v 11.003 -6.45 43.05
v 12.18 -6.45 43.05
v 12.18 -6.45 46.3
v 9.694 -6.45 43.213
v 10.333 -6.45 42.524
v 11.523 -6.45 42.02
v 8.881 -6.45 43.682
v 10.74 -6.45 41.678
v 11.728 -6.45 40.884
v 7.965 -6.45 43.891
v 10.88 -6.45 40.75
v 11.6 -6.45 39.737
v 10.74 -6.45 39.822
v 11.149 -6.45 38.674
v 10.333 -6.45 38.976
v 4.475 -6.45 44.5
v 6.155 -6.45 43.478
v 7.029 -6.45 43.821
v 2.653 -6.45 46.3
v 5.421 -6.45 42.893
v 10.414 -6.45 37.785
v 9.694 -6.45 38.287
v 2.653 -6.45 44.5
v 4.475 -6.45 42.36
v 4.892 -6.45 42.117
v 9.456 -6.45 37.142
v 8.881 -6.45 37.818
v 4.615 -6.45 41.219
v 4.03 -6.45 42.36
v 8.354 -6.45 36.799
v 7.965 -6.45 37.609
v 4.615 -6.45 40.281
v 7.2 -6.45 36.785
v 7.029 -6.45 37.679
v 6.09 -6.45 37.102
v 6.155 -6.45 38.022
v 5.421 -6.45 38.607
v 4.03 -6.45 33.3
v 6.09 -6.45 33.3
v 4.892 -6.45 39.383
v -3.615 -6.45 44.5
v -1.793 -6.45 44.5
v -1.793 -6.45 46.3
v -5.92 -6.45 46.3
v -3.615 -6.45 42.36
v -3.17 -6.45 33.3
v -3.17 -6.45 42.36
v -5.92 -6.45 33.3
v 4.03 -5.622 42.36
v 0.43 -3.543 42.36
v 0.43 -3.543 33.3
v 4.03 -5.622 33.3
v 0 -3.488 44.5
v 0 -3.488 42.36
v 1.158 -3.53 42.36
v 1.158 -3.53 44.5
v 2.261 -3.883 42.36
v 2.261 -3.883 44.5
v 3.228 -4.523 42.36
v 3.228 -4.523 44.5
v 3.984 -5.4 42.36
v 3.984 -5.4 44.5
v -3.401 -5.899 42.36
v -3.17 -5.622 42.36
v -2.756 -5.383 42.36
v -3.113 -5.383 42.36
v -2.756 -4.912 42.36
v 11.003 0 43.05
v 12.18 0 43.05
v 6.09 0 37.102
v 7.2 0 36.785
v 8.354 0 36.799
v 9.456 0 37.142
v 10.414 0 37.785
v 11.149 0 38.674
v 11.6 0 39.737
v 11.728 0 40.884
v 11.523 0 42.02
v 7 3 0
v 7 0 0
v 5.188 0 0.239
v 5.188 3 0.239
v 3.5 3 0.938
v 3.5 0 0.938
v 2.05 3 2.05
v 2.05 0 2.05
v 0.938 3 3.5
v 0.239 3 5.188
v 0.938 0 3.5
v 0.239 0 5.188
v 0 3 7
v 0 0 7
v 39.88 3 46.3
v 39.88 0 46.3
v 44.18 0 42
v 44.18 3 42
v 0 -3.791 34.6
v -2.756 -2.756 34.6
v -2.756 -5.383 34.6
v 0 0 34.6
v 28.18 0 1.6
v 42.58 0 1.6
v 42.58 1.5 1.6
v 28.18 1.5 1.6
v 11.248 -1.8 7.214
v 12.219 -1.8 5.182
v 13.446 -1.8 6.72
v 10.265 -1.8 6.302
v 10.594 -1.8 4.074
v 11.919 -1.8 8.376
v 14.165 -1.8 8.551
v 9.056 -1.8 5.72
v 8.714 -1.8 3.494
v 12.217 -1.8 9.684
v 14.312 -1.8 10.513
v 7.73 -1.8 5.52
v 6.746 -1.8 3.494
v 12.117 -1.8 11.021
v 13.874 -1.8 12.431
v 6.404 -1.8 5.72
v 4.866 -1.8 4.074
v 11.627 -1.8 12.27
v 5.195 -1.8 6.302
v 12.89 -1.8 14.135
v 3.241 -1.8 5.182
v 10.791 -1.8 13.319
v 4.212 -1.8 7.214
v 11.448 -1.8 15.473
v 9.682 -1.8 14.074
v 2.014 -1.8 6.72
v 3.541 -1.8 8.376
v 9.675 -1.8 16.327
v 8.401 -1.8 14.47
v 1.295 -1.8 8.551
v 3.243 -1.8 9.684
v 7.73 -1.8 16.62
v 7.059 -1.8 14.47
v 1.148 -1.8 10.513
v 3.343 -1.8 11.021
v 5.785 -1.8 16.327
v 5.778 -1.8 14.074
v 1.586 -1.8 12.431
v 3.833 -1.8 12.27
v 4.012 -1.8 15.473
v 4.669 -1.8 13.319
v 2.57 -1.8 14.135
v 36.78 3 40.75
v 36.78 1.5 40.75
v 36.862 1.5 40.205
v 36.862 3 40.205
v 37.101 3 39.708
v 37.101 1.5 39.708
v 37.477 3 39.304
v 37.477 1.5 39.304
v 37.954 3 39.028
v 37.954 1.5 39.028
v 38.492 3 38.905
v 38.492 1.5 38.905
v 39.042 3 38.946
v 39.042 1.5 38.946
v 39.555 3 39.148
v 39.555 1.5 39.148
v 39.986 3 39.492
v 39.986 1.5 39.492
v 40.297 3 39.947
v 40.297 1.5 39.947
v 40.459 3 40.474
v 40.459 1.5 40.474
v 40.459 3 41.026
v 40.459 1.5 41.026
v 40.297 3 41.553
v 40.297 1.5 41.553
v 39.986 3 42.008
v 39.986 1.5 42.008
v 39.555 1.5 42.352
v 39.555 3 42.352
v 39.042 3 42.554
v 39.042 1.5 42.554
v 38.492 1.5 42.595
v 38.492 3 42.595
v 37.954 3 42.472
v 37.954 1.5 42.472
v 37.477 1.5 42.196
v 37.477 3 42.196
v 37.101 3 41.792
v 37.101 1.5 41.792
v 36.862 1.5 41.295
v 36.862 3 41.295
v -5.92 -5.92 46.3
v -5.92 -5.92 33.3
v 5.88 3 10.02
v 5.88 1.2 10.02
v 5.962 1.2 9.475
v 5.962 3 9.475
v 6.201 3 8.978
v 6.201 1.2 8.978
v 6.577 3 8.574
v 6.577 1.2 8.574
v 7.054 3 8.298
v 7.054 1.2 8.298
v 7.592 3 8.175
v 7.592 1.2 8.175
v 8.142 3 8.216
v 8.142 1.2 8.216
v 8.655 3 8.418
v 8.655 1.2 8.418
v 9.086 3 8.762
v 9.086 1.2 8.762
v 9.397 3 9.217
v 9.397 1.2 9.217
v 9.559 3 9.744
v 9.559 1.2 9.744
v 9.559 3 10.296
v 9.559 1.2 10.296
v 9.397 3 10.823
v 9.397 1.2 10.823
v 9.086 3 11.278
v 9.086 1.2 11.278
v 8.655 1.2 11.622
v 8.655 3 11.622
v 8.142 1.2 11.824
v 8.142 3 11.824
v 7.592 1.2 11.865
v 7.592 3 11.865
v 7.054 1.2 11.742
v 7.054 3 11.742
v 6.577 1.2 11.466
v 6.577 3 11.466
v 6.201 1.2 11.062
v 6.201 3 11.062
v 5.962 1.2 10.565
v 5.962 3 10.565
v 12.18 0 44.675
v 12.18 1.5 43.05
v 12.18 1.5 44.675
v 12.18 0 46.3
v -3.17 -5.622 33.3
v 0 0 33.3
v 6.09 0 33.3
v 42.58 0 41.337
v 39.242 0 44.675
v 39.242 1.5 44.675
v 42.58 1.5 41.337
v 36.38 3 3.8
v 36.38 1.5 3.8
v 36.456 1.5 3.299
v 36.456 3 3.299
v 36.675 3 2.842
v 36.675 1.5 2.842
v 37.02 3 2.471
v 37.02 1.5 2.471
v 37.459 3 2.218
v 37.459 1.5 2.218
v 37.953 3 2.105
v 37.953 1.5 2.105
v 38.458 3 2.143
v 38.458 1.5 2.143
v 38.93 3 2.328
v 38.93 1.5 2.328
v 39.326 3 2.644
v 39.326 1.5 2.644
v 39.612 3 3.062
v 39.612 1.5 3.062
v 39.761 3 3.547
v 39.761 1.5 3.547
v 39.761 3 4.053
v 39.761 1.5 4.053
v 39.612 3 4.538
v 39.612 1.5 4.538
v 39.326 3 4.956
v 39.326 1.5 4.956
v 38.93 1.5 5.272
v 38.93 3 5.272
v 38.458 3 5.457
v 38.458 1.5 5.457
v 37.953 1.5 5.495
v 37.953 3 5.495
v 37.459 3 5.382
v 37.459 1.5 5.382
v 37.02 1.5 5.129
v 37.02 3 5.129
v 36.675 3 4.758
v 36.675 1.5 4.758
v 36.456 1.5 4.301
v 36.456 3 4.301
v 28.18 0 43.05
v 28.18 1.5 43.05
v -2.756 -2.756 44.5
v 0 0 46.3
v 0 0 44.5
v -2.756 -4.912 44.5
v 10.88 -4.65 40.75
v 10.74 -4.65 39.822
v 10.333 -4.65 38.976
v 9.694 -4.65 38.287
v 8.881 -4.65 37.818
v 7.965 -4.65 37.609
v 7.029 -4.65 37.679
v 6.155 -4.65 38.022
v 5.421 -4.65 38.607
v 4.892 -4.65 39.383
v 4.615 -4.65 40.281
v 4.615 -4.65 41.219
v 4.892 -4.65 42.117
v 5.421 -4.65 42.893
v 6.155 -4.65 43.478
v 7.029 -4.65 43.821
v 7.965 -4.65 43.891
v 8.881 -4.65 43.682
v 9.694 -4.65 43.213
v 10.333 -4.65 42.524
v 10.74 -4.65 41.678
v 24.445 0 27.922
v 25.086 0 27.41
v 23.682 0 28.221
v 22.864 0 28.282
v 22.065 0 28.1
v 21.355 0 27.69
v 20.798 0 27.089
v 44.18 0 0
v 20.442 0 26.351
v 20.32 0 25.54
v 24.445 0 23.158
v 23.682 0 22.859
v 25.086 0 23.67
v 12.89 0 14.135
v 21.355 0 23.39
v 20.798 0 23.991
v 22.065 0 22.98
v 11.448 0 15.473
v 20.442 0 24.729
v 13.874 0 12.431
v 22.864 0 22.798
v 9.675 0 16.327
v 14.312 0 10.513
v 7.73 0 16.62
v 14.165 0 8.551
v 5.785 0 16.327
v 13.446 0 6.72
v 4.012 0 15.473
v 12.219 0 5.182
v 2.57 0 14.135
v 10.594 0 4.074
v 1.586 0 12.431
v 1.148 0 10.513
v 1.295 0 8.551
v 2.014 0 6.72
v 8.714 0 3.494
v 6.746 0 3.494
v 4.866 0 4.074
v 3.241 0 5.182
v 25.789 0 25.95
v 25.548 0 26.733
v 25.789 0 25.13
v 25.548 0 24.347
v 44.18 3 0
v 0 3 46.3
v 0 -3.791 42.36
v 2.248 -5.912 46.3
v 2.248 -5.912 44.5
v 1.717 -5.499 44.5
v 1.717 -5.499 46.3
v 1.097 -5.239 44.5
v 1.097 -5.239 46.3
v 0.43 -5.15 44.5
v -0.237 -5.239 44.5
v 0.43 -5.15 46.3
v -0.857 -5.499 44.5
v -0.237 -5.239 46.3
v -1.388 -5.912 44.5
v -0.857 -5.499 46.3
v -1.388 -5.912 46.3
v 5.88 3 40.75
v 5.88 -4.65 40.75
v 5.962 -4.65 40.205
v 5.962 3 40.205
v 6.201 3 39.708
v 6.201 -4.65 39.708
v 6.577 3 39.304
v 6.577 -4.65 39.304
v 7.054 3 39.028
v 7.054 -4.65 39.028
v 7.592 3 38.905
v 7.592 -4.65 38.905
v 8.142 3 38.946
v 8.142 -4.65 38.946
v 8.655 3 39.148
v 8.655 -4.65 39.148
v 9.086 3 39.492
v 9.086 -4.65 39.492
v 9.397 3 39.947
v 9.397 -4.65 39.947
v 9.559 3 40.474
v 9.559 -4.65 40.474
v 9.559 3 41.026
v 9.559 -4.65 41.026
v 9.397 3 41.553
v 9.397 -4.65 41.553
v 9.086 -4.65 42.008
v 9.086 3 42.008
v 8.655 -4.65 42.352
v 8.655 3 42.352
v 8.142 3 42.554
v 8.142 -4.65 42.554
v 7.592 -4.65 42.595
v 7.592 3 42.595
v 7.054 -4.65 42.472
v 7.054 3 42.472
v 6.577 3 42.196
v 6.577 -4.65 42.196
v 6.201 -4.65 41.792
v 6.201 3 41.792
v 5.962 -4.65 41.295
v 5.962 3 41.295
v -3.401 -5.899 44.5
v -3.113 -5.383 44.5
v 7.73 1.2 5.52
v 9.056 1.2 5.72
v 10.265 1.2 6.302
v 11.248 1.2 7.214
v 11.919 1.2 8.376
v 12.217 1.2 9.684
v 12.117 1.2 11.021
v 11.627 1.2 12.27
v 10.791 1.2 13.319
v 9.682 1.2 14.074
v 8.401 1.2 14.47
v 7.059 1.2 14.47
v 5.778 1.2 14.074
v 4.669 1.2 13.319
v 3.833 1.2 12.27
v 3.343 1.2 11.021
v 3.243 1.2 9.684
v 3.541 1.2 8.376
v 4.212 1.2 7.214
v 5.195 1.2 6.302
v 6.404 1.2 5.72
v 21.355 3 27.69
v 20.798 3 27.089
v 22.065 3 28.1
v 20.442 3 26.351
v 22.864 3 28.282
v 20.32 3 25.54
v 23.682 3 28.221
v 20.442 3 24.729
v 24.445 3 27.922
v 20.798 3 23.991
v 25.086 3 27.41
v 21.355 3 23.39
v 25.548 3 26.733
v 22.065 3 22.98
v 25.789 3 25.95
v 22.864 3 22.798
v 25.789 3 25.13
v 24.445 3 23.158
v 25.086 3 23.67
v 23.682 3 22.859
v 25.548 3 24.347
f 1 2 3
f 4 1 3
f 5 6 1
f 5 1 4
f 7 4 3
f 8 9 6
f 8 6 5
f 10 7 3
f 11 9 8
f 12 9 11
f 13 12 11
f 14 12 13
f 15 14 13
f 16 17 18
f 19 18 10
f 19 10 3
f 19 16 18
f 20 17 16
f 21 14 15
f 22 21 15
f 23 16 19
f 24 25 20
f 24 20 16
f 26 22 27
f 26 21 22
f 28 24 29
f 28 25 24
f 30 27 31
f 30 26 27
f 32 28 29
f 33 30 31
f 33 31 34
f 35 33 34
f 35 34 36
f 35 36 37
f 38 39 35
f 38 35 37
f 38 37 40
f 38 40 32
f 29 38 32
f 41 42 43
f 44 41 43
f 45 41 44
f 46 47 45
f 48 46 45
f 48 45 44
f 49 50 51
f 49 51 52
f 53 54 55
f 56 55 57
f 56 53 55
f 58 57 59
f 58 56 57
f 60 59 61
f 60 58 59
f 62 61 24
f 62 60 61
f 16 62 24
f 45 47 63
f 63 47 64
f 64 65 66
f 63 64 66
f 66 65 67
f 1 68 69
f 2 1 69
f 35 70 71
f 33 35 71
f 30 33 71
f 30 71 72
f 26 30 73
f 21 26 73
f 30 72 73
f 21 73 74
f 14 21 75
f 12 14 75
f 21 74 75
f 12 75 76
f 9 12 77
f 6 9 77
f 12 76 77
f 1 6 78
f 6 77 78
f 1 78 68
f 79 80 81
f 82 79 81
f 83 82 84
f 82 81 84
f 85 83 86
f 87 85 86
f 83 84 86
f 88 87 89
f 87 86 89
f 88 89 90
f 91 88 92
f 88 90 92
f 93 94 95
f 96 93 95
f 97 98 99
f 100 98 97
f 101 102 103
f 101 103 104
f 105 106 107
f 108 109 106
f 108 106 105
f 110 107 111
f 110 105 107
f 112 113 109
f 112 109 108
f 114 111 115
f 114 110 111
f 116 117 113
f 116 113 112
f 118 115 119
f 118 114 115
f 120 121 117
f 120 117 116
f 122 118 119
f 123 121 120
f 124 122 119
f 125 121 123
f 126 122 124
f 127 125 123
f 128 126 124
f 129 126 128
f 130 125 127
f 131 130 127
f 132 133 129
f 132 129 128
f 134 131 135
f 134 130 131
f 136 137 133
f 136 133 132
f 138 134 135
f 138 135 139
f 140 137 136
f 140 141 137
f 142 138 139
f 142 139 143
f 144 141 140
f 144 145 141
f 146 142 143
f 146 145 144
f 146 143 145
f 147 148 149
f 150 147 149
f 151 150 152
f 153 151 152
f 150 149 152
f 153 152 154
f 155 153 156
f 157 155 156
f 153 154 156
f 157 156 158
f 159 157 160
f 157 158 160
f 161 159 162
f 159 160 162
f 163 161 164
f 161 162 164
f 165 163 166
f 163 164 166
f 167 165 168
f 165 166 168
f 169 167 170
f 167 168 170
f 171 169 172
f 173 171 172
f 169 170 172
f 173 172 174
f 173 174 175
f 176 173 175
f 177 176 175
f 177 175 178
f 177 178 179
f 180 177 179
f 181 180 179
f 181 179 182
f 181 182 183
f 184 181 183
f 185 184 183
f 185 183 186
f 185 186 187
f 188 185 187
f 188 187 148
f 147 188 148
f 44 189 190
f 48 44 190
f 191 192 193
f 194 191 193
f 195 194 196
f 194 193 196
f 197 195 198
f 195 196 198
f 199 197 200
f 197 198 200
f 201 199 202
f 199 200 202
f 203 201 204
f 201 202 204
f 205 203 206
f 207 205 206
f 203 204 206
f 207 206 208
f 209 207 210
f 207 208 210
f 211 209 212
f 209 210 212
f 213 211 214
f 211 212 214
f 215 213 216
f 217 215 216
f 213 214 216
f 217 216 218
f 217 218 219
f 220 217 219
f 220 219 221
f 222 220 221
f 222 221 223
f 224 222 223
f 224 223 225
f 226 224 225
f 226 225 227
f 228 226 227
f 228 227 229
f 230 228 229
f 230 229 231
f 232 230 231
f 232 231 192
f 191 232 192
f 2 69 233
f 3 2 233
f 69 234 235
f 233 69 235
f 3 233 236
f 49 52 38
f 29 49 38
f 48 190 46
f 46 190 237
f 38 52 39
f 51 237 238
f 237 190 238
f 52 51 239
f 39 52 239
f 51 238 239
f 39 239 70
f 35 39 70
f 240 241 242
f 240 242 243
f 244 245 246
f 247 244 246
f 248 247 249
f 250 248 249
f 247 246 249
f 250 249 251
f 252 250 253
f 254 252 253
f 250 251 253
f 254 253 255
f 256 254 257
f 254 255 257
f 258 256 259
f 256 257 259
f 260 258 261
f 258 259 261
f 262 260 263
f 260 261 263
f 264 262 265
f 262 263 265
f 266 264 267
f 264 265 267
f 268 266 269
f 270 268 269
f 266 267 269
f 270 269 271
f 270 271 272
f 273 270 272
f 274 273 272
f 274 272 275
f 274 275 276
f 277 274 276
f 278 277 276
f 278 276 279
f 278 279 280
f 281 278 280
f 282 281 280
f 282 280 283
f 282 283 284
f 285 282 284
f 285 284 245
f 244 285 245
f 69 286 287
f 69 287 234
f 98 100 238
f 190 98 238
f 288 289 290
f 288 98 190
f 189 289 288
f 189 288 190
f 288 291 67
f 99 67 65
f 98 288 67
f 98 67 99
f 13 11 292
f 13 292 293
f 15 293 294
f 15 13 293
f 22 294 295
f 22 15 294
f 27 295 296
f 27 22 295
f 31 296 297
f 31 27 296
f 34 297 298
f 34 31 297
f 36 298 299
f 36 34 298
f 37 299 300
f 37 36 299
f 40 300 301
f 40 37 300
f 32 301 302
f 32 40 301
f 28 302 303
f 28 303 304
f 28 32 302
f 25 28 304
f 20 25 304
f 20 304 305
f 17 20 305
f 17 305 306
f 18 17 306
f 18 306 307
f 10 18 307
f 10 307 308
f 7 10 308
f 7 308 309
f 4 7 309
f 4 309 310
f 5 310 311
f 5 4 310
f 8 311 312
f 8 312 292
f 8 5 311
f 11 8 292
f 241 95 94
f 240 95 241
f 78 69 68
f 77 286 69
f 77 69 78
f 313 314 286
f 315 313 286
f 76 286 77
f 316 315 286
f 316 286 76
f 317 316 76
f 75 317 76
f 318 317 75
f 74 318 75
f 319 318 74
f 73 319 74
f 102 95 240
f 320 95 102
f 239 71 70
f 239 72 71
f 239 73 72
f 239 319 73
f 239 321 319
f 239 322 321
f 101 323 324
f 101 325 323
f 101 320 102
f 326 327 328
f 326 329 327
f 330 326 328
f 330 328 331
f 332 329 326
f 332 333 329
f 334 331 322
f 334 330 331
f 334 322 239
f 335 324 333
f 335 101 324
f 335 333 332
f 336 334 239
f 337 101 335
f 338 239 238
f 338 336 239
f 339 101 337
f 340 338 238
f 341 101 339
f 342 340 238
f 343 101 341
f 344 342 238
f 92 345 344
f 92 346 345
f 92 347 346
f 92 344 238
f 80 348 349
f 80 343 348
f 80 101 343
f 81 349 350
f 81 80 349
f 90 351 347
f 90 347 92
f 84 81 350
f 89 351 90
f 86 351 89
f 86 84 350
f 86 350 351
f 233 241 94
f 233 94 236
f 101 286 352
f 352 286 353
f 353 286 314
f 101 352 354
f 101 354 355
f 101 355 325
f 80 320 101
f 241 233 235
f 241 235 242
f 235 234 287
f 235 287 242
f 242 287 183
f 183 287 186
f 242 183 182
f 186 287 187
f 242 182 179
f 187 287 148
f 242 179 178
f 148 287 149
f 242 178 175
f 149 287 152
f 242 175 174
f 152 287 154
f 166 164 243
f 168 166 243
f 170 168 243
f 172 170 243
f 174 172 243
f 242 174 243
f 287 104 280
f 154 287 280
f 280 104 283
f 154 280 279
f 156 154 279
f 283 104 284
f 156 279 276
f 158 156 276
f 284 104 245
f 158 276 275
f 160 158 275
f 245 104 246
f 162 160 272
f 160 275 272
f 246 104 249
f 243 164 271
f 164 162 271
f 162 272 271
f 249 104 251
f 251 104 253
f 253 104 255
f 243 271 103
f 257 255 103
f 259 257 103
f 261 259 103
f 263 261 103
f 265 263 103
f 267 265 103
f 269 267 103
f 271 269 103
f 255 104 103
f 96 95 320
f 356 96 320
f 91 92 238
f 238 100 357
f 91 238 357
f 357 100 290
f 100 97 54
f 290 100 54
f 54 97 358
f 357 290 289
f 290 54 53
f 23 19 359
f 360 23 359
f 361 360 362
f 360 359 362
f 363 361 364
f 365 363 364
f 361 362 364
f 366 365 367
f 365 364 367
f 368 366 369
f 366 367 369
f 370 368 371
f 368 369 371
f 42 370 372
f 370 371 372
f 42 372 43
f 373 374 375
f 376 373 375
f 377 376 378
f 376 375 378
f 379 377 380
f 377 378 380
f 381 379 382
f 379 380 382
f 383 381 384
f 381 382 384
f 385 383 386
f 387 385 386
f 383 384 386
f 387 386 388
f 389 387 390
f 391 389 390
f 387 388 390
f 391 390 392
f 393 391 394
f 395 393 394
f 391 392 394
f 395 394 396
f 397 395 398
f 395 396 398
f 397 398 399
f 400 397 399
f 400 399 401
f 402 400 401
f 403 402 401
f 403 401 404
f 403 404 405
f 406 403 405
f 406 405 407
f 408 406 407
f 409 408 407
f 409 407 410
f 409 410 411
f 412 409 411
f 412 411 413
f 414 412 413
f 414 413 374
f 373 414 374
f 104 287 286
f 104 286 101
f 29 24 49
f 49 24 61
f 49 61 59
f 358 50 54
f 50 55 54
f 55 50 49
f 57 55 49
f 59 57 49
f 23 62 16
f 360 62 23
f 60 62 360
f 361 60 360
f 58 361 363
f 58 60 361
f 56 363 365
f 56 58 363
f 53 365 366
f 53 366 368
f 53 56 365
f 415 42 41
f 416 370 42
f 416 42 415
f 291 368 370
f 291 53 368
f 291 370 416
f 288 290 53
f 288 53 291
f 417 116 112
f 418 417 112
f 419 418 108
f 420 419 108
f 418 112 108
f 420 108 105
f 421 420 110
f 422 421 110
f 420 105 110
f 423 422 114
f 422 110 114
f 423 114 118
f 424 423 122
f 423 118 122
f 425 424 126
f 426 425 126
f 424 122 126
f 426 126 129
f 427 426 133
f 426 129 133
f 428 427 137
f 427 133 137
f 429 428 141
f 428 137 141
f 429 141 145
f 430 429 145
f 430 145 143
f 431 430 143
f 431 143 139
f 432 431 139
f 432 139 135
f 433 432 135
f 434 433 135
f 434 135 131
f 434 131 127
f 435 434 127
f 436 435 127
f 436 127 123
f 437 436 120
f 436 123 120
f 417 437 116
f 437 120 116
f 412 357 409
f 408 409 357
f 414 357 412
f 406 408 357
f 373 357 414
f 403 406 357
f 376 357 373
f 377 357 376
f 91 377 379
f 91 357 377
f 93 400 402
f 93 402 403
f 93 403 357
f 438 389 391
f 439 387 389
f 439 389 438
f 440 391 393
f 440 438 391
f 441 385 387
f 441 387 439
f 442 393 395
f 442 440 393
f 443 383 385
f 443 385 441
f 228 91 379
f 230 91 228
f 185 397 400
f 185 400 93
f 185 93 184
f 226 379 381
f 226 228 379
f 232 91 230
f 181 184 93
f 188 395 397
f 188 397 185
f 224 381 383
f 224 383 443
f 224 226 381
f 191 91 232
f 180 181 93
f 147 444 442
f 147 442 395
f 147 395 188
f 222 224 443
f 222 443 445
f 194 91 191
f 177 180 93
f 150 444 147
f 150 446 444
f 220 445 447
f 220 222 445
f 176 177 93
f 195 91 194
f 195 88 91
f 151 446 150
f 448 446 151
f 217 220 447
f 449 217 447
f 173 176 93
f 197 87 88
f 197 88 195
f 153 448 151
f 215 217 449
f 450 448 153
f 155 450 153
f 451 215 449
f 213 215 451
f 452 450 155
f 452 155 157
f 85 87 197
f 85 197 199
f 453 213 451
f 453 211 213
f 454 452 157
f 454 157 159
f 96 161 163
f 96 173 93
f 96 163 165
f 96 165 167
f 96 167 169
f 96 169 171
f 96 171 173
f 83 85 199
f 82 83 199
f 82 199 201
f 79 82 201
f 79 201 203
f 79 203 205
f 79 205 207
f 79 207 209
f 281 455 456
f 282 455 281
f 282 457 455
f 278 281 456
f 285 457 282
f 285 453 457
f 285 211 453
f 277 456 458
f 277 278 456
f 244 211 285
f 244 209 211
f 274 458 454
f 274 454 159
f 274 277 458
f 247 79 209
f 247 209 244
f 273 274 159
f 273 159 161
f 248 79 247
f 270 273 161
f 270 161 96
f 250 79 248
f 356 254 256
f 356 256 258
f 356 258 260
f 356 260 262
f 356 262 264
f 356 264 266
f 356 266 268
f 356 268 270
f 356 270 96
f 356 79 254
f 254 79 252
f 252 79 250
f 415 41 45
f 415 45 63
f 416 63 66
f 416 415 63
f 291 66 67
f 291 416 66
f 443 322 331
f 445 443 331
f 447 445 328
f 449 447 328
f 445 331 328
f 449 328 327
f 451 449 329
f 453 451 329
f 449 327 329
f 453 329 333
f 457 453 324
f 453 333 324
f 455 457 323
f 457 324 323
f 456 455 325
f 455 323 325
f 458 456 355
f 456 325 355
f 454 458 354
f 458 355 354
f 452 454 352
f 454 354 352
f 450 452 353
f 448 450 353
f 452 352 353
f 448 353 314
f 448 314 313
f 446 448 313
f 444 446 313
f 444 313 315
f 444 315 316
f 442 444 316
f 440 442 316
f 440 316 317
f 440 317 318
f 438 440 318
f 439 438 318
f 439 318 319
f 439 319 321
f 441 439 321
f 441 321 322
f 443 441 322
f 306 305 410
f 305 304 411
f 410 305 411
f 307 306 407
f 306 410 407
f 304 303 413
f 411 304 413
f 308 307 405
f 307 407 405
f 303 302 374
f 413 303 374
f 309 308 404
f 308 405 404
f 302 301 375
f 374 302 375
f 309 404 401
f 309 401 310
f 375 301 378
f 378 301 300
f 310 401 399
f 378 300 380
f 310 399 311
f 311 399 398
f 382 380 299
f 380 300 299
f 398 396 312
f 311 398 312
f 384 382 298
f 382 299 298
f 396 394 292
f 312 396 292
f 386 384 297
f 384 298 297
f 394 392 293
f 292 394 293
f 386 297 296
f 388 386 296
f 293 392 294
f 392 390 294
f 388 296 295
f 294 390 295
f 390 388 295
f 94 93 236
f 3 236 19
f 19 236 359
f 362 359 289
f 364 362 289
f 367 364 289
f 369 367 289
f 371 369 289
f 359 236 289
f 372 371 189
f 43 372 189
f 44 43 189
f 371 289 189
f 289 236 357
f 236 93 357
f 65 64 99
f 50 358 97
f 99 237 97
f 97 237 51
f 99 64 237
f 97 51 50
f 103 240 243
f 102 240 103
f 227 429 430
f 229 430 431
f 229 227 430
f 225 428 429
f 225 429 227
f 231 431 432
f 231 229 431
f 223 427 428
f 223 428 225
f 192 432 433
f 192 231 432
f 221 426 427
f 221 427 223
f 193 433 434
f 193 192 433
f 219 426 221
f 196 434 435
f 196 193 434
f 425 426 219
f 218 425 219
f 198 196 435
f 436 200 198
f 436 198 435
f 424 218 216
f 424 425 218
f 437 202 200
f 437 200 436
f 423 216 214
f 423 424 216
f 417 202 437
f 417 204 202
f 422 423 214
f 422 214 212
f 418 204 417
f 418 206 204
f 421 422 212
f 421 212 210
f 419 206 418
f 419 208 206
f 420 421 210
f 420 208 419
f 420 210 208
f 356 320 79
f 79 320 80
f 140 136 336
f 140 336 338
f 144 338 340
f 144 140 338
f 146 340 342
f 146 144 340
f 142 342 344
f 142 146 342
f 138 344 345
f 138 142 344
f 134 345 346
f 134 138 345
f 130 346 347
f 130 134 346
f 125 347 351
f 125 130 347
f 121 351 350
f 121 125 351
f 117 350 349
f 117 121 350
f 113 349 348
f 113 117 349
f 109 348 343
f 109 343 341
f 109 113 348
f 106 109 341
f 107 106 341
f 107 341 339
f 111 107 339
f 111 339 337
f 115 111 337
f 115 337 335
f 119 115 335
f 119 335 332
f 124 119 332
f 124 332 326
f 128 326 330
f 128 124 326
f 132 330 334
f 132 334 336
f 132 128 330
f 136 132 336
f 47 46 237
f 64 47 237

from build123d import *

# Parameters (mm, degrees)
SKETCH1_R                  = 13.5
BOSS_EXTRUDE1_DEPTH        = 3
CAVITY26_OUTLINE_R         = 1.85
CAVITY26_OUTLINE_R_2       = 1.7
CAVITY26_DEPTH             = 1.5
F_24_0_24_DIAMETER_HOLE1_D = 3.7
BOSS_EXTRUDE2_START        = -3
SKETCH6_R                  = 13.5
BOSS_EXTRUDE2_DEPTH        = 3
F_24_0_24_DIAMETER_HOLE2_D = 5.5
SKETCH14_W                 = 5.92
SKETCH14_H                 = 13
BOSS_EXTRUDE6_DEPTH        = 9.45
SKETCH13_R                 = 4
BOSS_EXTRUDE7_DEPTH        = 6.45
BOSS_EXTRUDE8_DEPTH        = 6.45
F_24_0_24_DIAMETER_HOLE3_D = 3.7
CUT_EXTRUDE3_DEPTH         = 9.06
SKETCH19_R                 = 2.55
CUT_EXTRUDE4_DEPTH         = 1.8
CUT_EXTRUDE5_START         = -11.2
SKETCH23_R                 = 4.233528458
CUT_EXTRUDE5_DEPTH         = 2.14
SKETCH24_W                 = 2.756109072
SKETCH24_H                 = 9.9
CUT_EXTRUDE6_DEPTH         = 10
CAVITY27_DEPTH             = 1.5
CAVITY27_START             = -6.45
CAVITY27_2_OUTLINE_R       = 3.15
CAVITY27_2_OUTLINE_R_2     = 1.85
CAVITY27_2_DEPTH           = 1.8
BOSS_EXTRUDE9_START        = 1.8
SKETCH25_R                 = 6.6
SKETCH25_R_2               = 1.85
BOSS_EXTRUDE9_DEPTH        = 1.8
SKETCH26_R                 = 4.5
CUT_EXTRUDE7_DEPTH         = 3
SKETCH27_R                 = 1.85
BOSS_EXTRUDE10_DEPTH       = 3
CUT_EXTRUDE8_START         = -1.5
CUT_EXTRUDE8_DEPTH         = 1.5
CUT_EXTRUDE9_DEPTH         = 15
F_24_0_24_DIAMETER_HOLE4_D = 3.4


# Read off the part's stored shape, not the designer's step: Cavity26, Cavity27
with BuildPart() as part:
    # Sketch1 → Boss-Extrude1 (new body)
    with BuildSketch(Plane(origin=(0, 0, 0), x_dir=(1, 0, 0), z_dir=(0, 1, 0))):
        with BuildLine():
            Line((39.88, -46.3), (44.18, -42))
            Line((44.18, -42), (44.18, 0))
            Line((44.18, 0), (7, 0))
            ThreePointArc((7, 0), (2.050252532, -2.050252532), (0, -7))
            Line((0, -7), (0, -46.3))
            Line((0, -46.3), (39.88, -46.3))
        make_face()
        with Locations(Location((23.07, -25.54, 0), (0, 0, 270))):
            Circle(SKETCH1_R, mode=Mode.SUBTRACT)
    extrude(amount=BOSS_EXTRUDE1_DEPTH)

    # Cavity26 outline → Cavity26 (cut)
    # profile 1 of 2: a face of its own
    with BuildSketch(Plane(origin=(0, 0, 0), x_dir=(1, 0, 0), z_dir=(0, 1, 0))):
        with BuildLine():
            Line((40.98, -20.5), (35.593913126, -20.5))
            ThreePointArc((35.593913126, -20.5), (36.300391291, -22.855461624), (36.567866498, -25.3))
            Line((36.567866498, -25.3), (40.93, -25.3))
            Line((40.93, -25.3), (40.93, -37.4))
            Line((40.93, -37.4), (37.464525778, -37.4))
            ThreePointArc((37.464525778, -37.4), (35.919832787, -38.039832787), (35.28, -39.584525778))
            Line((35.28, -39.584525778), (35.28, -43.05))
            Line((35.28, -43.05), (12.18, -43.05))
            Line((12.18, -43.05), (12.18, -44.675))
            Line((12.18, -44.675), (39.2422583, -44.675))
            Line((39.2422583, -44.675), (42.58, -41.3372583))
            Line((42.58, -41.3372583), (42.58, -22.55))
            Line((42.58, -22.55), (40.98, -22.55))
            Line((40.98, -22.55), (40.98, -20.5))
        make_face()
        with Locations((38.63, -40.75)):
            Circle(CAVITY26_OUTLINE_R, mode=Mode.SUBTRACT)
    # profile 2 of 2: a face of its own
    with BuildSketch(Plane(origin=(0, 0, 0), x_dir=(1, 0, 0), z_dir=(0, 1, 0))):
        with BuildLine():
            Line((40.98, -6.35), (42.58, -6.35))
            Line((42.58, -6.35), (42.58, -1.6))
            Line((42.58, -1.6), (28.18, -1.6))
            Line((28.18, -1.6), (28.18, -10.6))
            Line((28.18, -10.6), (29.56, -10.6))
            Line((29.56, -10.6), (29.56, -8.2))
            Line((29.56, -8.2), (31.16, -8.2))
            Line((31.16, -8.2), (31.16, -6.35))
            Line((31.16, -6.35), (35.06, -6.35))
            Line((35.06, -6.35), (35.06, -8.4))
            Line((35.06, -8.4), (36.21908731, -8.4))
            ThreePointArc((36.21908731, -8.4), (38.578420387, -7.150450959), (40.98, -8.31674455))
            Line((40.98, -8.31674455), (40.98, -6.35))
        make_face()
        with Locations((38.08, -3.8)):
            Circle(CAVITY26_OUTLINE_R_2, mode=Mode.SUBTRACT)
    extrude(amount=CAVITY26_DEPTH, mode=Mode.SUBTRACT)

    # Ø24.0 (24) Diameter Hole1 (through all)
    with Locations(Plane(origin=(0, 3, 0), x_dir=(1, 0, 0), z_dir=(0, 1, 0))):
        with Locations((38.63, -10.1), (38.63, -40.75), (7.73, -40.75), (7.73, -10.02)):
            Hole(F_24_0_24_DIAMETER_HOLE1_D / 2)

    # Sketch6 → Boss-Extrude2 (add)
    with BuildSketch(Plane(origin=(0, 3, 0), x_dir=(1, 0, 0), z_dir=(0, 1, 0)).offset(BOSS_EXTRUDE2_START)):
        with Locations((23.07, -25.54)):
            Circle(SKETCH6_R)
    extrude(amount=BOSS_EXTRUDE2_DEPTH)

    # Ø24.0 (24) Diameter Hole2 (through all)
    with Locations(Plane(origin=(0, 3, 0), x_dir=(1, 0, 0), z_dir=(0, 1, 0))):
        with Locations((23.07, -25.54)):
            Hole(F_24_0_24_DIAMETER_HOLE2_D / 2)

    # Sketch14 → Boss-Extrude6 (add)
    with BuildSketch(Plane(origin=(0, 3, 0), x_dir=(1, 0, 0), z_dir=(0, 1, 0))):
        with Locations((-2.96, -39.8)):
            Rectangle(SKETCH14_W, SKETCH14_H)
    extrude(amount=-BOSS_EXTRUDE6_DEPTH)

    # Sketch13 → Boss-Extrude7 (add)
    with BuildSketch(Plane(origin=(0, 0, 0), x_dir=(-1, 0, 0), z_dir=(0, -1, 0))):
        with Locations(Location((-7.73, -40.75, 0), (0, 0, 270))):
            Circle(SKETCH13_R)
    extrude(amount=BOSS_EXTRUDE7_DEPTH)

    # Sketch15 → Boss-Extrude8 (add)
    with BuildSketch(Plane(origin=(0, 0, 0), x_dir=(-1, 0, 0), z_dir=(0, -1, 0))):
        with BuildLine():
            Line((-11.002613634, -43.05), (-12.18, -43.05))
            Line((-12.18, -43.05), (-12.18, -44.675))
            Line((-12.18, -44.675), (-12.18, -46.3))
            Line((-12.18, -46.3), (0, -46.3))
            Line((0, -46.3), (0, -33.3))
            Line((0, -33.3), (-6.09, -33.3))
            Line((-6.09, -33.3), (-6.09, -37.101657911))
            ThreePointArc((-6.09, -37.101657911), (-4.371428875, -38.577443902), (-3.73, -40.75))
            ThreePointArc((-3.73, -40.75), (-6.523860401, -44.563820561), (-11.002613634, -43.05))
        make_face()
    extrude(amount=BOSS_EXTRUDE8_DEPTH)

    # Ø24.0 (24) Diameter Hole3 (through all)
    with Locations(Plane(origin=(0, 3, 0), x_dir=(1, 0, 0), z_dir=(0, 1, 0))):
        with Locations((7.73, -40.75)):
            Hole(F_24_0_24_DIAMETER_HOLE3_D / 2)

    # Sketch18 → Cut-Extrude3 (cut)
    with BuildSketch(Plane(origin=(0, 0, 33.3), x_dir=(-1, 0, 0), z_dir=(0, 0, -1))):
        Polygon((-0.43, -11.856921938), (3.17, -9.778460969), (3.17, -5.621539031), (-0.43, -3.543078062), (-4.03, -5.621539031), (-4.03, -9.778460969), align=None)
    extrude(amount=-CUT_EXTRUDE3_DEPTH, mode=Mode.SUBTRACT)

    # Sketch19 → Cut-Extrude4 (cut)
    with BuildSketch(Plane.XY.offset(46.3)):
        with Locations((0.43, -7.7)):
            Circle(SKETCH19_R)
    extrude(amount=-CUT_EXTRUDE4_DEPTH, mode=Mode.SUBTRACT)

    # Sketch23 → Cut-Extrude5 (cut)
    with BuildSketch(Plane(origin=(0, 0, 33.3), x_dir=(-1, 0, 0), z_dir=(0, 0, -1)).offset(CUT_EXTRUDE5_START)):
        with Locations((-0.43, -7.7)):
            Circle(SKETCH23_R)
    extrude(amount=CUT_EXTRUDE5_DEPTH, mode=Mode.SUBTRACT)

    # Sketch24 → Cut-Extrude6 (cut)
    with BuildSketch(Plane(origin=(0, 3, 0), x_dir=(1, 0, 0), z_dir=(0, 1, 0))):
        with Locations((-1.378054536, -39.55)):
            Rectangle(SKETCH24_W, SKETCH24_H)
    extrude(amount=-CUT_EXTRUDE6_DEPTH, mode=Mode.SUBTRACT)

    # Cavity27 outline → Cavity27 (cut)
    with BuildSketch(Plane(origin=(0, 0, 0), x_dir=(1, 0, 0), z_dir=(0, 1, 0))):
        with BuildLine():
            ThreePointArc((28.18, -21.3), (29.351572875, -24.128427125), (32.18, -25.3))
            Line((32.18, -25.3), (36.567866498, -25.3))
            ThreePointArc((36.567866498, -25.3), (36.300391291, -22.855461624), (35.593913126, -20.5))
            Line((35.593913126, -20.5), (35.06, -20.5))
            Line((35.06, -20.5), (35.06, -22.55))
            Line((35.06, -22.55), (31.16, -22.55))
            Line((31.16, -22.55), (31.16, -20.7))
            Line((31.16, -20.7), (29.56, -20.7))
            Line((29.56, -20.7), (29.56, -18.3))
            Line((29.56, -18.3), (28.18, -18.3))
            Line((28.18, -18.3), (28.18, -21.3))
        make_face()
    extrude(amount=CAVITY27_DEPTH, mode=Mode.SUBTRACT)

    # Cavity27 2 outline → Cavity27 2 (cut)
    with BuildSketch(Plane(origin=(0, 0, 0), x_dir=(1, 0, 0), z_dir=(0, 1, 0)).offset(CAVITY27_START)):
        with Locations((7.73, -40.75)):
            Circle(CAVITY27_2_OUTLINE_R)
        with Locations((7.73, -40.75)):
            Circle(CAVITY27_2_OUTLINE_R_2, mode=Mode.SUBTRACT)
    extrude(amount=CAVITY27_2_DEPTH, mode=Mode.SUBTRACT)

    # Sketch25 → Boss-Extrude9 (add)
    with BuildSketch(Plane.XZ.offset(BOSS_EXTRUDE9_START)):
        with Locations(Location((7.73, 10.02, 0), (0, 0, 90))):
            Circle(SKETCH25_R)
        with Locations(Location((7.73, 10.02, 0), (0, 0, 90))):
            Circle(SKETCH25_R_2, mode=Mode.SUBTRACT)
    extrude(amount=-BOSS_EXTRUDE9_DEPTH)

    # Sketch26 → Cut-Extrude7 (cut)
    with BuildSketch(Plane(origin=(0, -1.8, 0), x_dir=(-1, 0, 0), z_dir=(0, -1, 0))):
        with Locations(Location((-7.73, -10.02, 0), (0, 0, 90))):
            Circle(SKETCH26_R)
    extrude(amount=-CUT_EXTRUDE7_DEPTH, mode=Mode.SUBTRACT)

    # Sketch27 → Boss-Extrude10 (add)
    with BuildSketch(Plane(origin=(0, 0, 0), x_dir=(-1, 0, 0), z_dir=(0, -1, 0))):
        with Locations((-38.63, -10.1)):
            Circle(SKETCH27_R)
    extrude(amount=-BOSS_EXTRUDE10_DEPTH)

    # Sketch28 → Cut-Extrude8 (cut)
    with BuildSketch(Plane(origin=(0, 0, 0), x_dir=(-1, 0, 0), z_dir=(0, -1, 0)).offset(CUT_EXTRUDE8_START)):
        Polygon((-42.58, -22.55), (-42.58, -1.6), (-28.18, -1.6), (-28.18, -18.3), (-28.18, -43.05), (-35.28, -43.05), (-40.91112915, -43.00612915), (-42.217305027, -41.699953273), align=None)
    extrude(amount=CUT_EXTRUDE8_DEPTH, mode=Mode.SUBTRACT)

    # Sketch29 → Cut-Extrude9 (cut)
    with BuildSketch(Plane.XY.offset(46.3)):
        Polygon((0, 0), (-5.92, -5.92), (-5.92, 3), (0, 3), align=None)
    extrude(amount=-CUT_EXTRUDE9_DEPTH, mode=Mode.SUBTRACT)

    # Ø24.0 (24) Diameter Hole4 (through all)
    with Locations(Plane(origin=(0, 3, 0), x_dir=(1, 0, 0), z_dir=(0, 1, 0))):
        with Locations((38.08, -3.8)):
            Hole(F_24_0_24_DIAMETER_HOLE4_D / 2)


solid = part.part
